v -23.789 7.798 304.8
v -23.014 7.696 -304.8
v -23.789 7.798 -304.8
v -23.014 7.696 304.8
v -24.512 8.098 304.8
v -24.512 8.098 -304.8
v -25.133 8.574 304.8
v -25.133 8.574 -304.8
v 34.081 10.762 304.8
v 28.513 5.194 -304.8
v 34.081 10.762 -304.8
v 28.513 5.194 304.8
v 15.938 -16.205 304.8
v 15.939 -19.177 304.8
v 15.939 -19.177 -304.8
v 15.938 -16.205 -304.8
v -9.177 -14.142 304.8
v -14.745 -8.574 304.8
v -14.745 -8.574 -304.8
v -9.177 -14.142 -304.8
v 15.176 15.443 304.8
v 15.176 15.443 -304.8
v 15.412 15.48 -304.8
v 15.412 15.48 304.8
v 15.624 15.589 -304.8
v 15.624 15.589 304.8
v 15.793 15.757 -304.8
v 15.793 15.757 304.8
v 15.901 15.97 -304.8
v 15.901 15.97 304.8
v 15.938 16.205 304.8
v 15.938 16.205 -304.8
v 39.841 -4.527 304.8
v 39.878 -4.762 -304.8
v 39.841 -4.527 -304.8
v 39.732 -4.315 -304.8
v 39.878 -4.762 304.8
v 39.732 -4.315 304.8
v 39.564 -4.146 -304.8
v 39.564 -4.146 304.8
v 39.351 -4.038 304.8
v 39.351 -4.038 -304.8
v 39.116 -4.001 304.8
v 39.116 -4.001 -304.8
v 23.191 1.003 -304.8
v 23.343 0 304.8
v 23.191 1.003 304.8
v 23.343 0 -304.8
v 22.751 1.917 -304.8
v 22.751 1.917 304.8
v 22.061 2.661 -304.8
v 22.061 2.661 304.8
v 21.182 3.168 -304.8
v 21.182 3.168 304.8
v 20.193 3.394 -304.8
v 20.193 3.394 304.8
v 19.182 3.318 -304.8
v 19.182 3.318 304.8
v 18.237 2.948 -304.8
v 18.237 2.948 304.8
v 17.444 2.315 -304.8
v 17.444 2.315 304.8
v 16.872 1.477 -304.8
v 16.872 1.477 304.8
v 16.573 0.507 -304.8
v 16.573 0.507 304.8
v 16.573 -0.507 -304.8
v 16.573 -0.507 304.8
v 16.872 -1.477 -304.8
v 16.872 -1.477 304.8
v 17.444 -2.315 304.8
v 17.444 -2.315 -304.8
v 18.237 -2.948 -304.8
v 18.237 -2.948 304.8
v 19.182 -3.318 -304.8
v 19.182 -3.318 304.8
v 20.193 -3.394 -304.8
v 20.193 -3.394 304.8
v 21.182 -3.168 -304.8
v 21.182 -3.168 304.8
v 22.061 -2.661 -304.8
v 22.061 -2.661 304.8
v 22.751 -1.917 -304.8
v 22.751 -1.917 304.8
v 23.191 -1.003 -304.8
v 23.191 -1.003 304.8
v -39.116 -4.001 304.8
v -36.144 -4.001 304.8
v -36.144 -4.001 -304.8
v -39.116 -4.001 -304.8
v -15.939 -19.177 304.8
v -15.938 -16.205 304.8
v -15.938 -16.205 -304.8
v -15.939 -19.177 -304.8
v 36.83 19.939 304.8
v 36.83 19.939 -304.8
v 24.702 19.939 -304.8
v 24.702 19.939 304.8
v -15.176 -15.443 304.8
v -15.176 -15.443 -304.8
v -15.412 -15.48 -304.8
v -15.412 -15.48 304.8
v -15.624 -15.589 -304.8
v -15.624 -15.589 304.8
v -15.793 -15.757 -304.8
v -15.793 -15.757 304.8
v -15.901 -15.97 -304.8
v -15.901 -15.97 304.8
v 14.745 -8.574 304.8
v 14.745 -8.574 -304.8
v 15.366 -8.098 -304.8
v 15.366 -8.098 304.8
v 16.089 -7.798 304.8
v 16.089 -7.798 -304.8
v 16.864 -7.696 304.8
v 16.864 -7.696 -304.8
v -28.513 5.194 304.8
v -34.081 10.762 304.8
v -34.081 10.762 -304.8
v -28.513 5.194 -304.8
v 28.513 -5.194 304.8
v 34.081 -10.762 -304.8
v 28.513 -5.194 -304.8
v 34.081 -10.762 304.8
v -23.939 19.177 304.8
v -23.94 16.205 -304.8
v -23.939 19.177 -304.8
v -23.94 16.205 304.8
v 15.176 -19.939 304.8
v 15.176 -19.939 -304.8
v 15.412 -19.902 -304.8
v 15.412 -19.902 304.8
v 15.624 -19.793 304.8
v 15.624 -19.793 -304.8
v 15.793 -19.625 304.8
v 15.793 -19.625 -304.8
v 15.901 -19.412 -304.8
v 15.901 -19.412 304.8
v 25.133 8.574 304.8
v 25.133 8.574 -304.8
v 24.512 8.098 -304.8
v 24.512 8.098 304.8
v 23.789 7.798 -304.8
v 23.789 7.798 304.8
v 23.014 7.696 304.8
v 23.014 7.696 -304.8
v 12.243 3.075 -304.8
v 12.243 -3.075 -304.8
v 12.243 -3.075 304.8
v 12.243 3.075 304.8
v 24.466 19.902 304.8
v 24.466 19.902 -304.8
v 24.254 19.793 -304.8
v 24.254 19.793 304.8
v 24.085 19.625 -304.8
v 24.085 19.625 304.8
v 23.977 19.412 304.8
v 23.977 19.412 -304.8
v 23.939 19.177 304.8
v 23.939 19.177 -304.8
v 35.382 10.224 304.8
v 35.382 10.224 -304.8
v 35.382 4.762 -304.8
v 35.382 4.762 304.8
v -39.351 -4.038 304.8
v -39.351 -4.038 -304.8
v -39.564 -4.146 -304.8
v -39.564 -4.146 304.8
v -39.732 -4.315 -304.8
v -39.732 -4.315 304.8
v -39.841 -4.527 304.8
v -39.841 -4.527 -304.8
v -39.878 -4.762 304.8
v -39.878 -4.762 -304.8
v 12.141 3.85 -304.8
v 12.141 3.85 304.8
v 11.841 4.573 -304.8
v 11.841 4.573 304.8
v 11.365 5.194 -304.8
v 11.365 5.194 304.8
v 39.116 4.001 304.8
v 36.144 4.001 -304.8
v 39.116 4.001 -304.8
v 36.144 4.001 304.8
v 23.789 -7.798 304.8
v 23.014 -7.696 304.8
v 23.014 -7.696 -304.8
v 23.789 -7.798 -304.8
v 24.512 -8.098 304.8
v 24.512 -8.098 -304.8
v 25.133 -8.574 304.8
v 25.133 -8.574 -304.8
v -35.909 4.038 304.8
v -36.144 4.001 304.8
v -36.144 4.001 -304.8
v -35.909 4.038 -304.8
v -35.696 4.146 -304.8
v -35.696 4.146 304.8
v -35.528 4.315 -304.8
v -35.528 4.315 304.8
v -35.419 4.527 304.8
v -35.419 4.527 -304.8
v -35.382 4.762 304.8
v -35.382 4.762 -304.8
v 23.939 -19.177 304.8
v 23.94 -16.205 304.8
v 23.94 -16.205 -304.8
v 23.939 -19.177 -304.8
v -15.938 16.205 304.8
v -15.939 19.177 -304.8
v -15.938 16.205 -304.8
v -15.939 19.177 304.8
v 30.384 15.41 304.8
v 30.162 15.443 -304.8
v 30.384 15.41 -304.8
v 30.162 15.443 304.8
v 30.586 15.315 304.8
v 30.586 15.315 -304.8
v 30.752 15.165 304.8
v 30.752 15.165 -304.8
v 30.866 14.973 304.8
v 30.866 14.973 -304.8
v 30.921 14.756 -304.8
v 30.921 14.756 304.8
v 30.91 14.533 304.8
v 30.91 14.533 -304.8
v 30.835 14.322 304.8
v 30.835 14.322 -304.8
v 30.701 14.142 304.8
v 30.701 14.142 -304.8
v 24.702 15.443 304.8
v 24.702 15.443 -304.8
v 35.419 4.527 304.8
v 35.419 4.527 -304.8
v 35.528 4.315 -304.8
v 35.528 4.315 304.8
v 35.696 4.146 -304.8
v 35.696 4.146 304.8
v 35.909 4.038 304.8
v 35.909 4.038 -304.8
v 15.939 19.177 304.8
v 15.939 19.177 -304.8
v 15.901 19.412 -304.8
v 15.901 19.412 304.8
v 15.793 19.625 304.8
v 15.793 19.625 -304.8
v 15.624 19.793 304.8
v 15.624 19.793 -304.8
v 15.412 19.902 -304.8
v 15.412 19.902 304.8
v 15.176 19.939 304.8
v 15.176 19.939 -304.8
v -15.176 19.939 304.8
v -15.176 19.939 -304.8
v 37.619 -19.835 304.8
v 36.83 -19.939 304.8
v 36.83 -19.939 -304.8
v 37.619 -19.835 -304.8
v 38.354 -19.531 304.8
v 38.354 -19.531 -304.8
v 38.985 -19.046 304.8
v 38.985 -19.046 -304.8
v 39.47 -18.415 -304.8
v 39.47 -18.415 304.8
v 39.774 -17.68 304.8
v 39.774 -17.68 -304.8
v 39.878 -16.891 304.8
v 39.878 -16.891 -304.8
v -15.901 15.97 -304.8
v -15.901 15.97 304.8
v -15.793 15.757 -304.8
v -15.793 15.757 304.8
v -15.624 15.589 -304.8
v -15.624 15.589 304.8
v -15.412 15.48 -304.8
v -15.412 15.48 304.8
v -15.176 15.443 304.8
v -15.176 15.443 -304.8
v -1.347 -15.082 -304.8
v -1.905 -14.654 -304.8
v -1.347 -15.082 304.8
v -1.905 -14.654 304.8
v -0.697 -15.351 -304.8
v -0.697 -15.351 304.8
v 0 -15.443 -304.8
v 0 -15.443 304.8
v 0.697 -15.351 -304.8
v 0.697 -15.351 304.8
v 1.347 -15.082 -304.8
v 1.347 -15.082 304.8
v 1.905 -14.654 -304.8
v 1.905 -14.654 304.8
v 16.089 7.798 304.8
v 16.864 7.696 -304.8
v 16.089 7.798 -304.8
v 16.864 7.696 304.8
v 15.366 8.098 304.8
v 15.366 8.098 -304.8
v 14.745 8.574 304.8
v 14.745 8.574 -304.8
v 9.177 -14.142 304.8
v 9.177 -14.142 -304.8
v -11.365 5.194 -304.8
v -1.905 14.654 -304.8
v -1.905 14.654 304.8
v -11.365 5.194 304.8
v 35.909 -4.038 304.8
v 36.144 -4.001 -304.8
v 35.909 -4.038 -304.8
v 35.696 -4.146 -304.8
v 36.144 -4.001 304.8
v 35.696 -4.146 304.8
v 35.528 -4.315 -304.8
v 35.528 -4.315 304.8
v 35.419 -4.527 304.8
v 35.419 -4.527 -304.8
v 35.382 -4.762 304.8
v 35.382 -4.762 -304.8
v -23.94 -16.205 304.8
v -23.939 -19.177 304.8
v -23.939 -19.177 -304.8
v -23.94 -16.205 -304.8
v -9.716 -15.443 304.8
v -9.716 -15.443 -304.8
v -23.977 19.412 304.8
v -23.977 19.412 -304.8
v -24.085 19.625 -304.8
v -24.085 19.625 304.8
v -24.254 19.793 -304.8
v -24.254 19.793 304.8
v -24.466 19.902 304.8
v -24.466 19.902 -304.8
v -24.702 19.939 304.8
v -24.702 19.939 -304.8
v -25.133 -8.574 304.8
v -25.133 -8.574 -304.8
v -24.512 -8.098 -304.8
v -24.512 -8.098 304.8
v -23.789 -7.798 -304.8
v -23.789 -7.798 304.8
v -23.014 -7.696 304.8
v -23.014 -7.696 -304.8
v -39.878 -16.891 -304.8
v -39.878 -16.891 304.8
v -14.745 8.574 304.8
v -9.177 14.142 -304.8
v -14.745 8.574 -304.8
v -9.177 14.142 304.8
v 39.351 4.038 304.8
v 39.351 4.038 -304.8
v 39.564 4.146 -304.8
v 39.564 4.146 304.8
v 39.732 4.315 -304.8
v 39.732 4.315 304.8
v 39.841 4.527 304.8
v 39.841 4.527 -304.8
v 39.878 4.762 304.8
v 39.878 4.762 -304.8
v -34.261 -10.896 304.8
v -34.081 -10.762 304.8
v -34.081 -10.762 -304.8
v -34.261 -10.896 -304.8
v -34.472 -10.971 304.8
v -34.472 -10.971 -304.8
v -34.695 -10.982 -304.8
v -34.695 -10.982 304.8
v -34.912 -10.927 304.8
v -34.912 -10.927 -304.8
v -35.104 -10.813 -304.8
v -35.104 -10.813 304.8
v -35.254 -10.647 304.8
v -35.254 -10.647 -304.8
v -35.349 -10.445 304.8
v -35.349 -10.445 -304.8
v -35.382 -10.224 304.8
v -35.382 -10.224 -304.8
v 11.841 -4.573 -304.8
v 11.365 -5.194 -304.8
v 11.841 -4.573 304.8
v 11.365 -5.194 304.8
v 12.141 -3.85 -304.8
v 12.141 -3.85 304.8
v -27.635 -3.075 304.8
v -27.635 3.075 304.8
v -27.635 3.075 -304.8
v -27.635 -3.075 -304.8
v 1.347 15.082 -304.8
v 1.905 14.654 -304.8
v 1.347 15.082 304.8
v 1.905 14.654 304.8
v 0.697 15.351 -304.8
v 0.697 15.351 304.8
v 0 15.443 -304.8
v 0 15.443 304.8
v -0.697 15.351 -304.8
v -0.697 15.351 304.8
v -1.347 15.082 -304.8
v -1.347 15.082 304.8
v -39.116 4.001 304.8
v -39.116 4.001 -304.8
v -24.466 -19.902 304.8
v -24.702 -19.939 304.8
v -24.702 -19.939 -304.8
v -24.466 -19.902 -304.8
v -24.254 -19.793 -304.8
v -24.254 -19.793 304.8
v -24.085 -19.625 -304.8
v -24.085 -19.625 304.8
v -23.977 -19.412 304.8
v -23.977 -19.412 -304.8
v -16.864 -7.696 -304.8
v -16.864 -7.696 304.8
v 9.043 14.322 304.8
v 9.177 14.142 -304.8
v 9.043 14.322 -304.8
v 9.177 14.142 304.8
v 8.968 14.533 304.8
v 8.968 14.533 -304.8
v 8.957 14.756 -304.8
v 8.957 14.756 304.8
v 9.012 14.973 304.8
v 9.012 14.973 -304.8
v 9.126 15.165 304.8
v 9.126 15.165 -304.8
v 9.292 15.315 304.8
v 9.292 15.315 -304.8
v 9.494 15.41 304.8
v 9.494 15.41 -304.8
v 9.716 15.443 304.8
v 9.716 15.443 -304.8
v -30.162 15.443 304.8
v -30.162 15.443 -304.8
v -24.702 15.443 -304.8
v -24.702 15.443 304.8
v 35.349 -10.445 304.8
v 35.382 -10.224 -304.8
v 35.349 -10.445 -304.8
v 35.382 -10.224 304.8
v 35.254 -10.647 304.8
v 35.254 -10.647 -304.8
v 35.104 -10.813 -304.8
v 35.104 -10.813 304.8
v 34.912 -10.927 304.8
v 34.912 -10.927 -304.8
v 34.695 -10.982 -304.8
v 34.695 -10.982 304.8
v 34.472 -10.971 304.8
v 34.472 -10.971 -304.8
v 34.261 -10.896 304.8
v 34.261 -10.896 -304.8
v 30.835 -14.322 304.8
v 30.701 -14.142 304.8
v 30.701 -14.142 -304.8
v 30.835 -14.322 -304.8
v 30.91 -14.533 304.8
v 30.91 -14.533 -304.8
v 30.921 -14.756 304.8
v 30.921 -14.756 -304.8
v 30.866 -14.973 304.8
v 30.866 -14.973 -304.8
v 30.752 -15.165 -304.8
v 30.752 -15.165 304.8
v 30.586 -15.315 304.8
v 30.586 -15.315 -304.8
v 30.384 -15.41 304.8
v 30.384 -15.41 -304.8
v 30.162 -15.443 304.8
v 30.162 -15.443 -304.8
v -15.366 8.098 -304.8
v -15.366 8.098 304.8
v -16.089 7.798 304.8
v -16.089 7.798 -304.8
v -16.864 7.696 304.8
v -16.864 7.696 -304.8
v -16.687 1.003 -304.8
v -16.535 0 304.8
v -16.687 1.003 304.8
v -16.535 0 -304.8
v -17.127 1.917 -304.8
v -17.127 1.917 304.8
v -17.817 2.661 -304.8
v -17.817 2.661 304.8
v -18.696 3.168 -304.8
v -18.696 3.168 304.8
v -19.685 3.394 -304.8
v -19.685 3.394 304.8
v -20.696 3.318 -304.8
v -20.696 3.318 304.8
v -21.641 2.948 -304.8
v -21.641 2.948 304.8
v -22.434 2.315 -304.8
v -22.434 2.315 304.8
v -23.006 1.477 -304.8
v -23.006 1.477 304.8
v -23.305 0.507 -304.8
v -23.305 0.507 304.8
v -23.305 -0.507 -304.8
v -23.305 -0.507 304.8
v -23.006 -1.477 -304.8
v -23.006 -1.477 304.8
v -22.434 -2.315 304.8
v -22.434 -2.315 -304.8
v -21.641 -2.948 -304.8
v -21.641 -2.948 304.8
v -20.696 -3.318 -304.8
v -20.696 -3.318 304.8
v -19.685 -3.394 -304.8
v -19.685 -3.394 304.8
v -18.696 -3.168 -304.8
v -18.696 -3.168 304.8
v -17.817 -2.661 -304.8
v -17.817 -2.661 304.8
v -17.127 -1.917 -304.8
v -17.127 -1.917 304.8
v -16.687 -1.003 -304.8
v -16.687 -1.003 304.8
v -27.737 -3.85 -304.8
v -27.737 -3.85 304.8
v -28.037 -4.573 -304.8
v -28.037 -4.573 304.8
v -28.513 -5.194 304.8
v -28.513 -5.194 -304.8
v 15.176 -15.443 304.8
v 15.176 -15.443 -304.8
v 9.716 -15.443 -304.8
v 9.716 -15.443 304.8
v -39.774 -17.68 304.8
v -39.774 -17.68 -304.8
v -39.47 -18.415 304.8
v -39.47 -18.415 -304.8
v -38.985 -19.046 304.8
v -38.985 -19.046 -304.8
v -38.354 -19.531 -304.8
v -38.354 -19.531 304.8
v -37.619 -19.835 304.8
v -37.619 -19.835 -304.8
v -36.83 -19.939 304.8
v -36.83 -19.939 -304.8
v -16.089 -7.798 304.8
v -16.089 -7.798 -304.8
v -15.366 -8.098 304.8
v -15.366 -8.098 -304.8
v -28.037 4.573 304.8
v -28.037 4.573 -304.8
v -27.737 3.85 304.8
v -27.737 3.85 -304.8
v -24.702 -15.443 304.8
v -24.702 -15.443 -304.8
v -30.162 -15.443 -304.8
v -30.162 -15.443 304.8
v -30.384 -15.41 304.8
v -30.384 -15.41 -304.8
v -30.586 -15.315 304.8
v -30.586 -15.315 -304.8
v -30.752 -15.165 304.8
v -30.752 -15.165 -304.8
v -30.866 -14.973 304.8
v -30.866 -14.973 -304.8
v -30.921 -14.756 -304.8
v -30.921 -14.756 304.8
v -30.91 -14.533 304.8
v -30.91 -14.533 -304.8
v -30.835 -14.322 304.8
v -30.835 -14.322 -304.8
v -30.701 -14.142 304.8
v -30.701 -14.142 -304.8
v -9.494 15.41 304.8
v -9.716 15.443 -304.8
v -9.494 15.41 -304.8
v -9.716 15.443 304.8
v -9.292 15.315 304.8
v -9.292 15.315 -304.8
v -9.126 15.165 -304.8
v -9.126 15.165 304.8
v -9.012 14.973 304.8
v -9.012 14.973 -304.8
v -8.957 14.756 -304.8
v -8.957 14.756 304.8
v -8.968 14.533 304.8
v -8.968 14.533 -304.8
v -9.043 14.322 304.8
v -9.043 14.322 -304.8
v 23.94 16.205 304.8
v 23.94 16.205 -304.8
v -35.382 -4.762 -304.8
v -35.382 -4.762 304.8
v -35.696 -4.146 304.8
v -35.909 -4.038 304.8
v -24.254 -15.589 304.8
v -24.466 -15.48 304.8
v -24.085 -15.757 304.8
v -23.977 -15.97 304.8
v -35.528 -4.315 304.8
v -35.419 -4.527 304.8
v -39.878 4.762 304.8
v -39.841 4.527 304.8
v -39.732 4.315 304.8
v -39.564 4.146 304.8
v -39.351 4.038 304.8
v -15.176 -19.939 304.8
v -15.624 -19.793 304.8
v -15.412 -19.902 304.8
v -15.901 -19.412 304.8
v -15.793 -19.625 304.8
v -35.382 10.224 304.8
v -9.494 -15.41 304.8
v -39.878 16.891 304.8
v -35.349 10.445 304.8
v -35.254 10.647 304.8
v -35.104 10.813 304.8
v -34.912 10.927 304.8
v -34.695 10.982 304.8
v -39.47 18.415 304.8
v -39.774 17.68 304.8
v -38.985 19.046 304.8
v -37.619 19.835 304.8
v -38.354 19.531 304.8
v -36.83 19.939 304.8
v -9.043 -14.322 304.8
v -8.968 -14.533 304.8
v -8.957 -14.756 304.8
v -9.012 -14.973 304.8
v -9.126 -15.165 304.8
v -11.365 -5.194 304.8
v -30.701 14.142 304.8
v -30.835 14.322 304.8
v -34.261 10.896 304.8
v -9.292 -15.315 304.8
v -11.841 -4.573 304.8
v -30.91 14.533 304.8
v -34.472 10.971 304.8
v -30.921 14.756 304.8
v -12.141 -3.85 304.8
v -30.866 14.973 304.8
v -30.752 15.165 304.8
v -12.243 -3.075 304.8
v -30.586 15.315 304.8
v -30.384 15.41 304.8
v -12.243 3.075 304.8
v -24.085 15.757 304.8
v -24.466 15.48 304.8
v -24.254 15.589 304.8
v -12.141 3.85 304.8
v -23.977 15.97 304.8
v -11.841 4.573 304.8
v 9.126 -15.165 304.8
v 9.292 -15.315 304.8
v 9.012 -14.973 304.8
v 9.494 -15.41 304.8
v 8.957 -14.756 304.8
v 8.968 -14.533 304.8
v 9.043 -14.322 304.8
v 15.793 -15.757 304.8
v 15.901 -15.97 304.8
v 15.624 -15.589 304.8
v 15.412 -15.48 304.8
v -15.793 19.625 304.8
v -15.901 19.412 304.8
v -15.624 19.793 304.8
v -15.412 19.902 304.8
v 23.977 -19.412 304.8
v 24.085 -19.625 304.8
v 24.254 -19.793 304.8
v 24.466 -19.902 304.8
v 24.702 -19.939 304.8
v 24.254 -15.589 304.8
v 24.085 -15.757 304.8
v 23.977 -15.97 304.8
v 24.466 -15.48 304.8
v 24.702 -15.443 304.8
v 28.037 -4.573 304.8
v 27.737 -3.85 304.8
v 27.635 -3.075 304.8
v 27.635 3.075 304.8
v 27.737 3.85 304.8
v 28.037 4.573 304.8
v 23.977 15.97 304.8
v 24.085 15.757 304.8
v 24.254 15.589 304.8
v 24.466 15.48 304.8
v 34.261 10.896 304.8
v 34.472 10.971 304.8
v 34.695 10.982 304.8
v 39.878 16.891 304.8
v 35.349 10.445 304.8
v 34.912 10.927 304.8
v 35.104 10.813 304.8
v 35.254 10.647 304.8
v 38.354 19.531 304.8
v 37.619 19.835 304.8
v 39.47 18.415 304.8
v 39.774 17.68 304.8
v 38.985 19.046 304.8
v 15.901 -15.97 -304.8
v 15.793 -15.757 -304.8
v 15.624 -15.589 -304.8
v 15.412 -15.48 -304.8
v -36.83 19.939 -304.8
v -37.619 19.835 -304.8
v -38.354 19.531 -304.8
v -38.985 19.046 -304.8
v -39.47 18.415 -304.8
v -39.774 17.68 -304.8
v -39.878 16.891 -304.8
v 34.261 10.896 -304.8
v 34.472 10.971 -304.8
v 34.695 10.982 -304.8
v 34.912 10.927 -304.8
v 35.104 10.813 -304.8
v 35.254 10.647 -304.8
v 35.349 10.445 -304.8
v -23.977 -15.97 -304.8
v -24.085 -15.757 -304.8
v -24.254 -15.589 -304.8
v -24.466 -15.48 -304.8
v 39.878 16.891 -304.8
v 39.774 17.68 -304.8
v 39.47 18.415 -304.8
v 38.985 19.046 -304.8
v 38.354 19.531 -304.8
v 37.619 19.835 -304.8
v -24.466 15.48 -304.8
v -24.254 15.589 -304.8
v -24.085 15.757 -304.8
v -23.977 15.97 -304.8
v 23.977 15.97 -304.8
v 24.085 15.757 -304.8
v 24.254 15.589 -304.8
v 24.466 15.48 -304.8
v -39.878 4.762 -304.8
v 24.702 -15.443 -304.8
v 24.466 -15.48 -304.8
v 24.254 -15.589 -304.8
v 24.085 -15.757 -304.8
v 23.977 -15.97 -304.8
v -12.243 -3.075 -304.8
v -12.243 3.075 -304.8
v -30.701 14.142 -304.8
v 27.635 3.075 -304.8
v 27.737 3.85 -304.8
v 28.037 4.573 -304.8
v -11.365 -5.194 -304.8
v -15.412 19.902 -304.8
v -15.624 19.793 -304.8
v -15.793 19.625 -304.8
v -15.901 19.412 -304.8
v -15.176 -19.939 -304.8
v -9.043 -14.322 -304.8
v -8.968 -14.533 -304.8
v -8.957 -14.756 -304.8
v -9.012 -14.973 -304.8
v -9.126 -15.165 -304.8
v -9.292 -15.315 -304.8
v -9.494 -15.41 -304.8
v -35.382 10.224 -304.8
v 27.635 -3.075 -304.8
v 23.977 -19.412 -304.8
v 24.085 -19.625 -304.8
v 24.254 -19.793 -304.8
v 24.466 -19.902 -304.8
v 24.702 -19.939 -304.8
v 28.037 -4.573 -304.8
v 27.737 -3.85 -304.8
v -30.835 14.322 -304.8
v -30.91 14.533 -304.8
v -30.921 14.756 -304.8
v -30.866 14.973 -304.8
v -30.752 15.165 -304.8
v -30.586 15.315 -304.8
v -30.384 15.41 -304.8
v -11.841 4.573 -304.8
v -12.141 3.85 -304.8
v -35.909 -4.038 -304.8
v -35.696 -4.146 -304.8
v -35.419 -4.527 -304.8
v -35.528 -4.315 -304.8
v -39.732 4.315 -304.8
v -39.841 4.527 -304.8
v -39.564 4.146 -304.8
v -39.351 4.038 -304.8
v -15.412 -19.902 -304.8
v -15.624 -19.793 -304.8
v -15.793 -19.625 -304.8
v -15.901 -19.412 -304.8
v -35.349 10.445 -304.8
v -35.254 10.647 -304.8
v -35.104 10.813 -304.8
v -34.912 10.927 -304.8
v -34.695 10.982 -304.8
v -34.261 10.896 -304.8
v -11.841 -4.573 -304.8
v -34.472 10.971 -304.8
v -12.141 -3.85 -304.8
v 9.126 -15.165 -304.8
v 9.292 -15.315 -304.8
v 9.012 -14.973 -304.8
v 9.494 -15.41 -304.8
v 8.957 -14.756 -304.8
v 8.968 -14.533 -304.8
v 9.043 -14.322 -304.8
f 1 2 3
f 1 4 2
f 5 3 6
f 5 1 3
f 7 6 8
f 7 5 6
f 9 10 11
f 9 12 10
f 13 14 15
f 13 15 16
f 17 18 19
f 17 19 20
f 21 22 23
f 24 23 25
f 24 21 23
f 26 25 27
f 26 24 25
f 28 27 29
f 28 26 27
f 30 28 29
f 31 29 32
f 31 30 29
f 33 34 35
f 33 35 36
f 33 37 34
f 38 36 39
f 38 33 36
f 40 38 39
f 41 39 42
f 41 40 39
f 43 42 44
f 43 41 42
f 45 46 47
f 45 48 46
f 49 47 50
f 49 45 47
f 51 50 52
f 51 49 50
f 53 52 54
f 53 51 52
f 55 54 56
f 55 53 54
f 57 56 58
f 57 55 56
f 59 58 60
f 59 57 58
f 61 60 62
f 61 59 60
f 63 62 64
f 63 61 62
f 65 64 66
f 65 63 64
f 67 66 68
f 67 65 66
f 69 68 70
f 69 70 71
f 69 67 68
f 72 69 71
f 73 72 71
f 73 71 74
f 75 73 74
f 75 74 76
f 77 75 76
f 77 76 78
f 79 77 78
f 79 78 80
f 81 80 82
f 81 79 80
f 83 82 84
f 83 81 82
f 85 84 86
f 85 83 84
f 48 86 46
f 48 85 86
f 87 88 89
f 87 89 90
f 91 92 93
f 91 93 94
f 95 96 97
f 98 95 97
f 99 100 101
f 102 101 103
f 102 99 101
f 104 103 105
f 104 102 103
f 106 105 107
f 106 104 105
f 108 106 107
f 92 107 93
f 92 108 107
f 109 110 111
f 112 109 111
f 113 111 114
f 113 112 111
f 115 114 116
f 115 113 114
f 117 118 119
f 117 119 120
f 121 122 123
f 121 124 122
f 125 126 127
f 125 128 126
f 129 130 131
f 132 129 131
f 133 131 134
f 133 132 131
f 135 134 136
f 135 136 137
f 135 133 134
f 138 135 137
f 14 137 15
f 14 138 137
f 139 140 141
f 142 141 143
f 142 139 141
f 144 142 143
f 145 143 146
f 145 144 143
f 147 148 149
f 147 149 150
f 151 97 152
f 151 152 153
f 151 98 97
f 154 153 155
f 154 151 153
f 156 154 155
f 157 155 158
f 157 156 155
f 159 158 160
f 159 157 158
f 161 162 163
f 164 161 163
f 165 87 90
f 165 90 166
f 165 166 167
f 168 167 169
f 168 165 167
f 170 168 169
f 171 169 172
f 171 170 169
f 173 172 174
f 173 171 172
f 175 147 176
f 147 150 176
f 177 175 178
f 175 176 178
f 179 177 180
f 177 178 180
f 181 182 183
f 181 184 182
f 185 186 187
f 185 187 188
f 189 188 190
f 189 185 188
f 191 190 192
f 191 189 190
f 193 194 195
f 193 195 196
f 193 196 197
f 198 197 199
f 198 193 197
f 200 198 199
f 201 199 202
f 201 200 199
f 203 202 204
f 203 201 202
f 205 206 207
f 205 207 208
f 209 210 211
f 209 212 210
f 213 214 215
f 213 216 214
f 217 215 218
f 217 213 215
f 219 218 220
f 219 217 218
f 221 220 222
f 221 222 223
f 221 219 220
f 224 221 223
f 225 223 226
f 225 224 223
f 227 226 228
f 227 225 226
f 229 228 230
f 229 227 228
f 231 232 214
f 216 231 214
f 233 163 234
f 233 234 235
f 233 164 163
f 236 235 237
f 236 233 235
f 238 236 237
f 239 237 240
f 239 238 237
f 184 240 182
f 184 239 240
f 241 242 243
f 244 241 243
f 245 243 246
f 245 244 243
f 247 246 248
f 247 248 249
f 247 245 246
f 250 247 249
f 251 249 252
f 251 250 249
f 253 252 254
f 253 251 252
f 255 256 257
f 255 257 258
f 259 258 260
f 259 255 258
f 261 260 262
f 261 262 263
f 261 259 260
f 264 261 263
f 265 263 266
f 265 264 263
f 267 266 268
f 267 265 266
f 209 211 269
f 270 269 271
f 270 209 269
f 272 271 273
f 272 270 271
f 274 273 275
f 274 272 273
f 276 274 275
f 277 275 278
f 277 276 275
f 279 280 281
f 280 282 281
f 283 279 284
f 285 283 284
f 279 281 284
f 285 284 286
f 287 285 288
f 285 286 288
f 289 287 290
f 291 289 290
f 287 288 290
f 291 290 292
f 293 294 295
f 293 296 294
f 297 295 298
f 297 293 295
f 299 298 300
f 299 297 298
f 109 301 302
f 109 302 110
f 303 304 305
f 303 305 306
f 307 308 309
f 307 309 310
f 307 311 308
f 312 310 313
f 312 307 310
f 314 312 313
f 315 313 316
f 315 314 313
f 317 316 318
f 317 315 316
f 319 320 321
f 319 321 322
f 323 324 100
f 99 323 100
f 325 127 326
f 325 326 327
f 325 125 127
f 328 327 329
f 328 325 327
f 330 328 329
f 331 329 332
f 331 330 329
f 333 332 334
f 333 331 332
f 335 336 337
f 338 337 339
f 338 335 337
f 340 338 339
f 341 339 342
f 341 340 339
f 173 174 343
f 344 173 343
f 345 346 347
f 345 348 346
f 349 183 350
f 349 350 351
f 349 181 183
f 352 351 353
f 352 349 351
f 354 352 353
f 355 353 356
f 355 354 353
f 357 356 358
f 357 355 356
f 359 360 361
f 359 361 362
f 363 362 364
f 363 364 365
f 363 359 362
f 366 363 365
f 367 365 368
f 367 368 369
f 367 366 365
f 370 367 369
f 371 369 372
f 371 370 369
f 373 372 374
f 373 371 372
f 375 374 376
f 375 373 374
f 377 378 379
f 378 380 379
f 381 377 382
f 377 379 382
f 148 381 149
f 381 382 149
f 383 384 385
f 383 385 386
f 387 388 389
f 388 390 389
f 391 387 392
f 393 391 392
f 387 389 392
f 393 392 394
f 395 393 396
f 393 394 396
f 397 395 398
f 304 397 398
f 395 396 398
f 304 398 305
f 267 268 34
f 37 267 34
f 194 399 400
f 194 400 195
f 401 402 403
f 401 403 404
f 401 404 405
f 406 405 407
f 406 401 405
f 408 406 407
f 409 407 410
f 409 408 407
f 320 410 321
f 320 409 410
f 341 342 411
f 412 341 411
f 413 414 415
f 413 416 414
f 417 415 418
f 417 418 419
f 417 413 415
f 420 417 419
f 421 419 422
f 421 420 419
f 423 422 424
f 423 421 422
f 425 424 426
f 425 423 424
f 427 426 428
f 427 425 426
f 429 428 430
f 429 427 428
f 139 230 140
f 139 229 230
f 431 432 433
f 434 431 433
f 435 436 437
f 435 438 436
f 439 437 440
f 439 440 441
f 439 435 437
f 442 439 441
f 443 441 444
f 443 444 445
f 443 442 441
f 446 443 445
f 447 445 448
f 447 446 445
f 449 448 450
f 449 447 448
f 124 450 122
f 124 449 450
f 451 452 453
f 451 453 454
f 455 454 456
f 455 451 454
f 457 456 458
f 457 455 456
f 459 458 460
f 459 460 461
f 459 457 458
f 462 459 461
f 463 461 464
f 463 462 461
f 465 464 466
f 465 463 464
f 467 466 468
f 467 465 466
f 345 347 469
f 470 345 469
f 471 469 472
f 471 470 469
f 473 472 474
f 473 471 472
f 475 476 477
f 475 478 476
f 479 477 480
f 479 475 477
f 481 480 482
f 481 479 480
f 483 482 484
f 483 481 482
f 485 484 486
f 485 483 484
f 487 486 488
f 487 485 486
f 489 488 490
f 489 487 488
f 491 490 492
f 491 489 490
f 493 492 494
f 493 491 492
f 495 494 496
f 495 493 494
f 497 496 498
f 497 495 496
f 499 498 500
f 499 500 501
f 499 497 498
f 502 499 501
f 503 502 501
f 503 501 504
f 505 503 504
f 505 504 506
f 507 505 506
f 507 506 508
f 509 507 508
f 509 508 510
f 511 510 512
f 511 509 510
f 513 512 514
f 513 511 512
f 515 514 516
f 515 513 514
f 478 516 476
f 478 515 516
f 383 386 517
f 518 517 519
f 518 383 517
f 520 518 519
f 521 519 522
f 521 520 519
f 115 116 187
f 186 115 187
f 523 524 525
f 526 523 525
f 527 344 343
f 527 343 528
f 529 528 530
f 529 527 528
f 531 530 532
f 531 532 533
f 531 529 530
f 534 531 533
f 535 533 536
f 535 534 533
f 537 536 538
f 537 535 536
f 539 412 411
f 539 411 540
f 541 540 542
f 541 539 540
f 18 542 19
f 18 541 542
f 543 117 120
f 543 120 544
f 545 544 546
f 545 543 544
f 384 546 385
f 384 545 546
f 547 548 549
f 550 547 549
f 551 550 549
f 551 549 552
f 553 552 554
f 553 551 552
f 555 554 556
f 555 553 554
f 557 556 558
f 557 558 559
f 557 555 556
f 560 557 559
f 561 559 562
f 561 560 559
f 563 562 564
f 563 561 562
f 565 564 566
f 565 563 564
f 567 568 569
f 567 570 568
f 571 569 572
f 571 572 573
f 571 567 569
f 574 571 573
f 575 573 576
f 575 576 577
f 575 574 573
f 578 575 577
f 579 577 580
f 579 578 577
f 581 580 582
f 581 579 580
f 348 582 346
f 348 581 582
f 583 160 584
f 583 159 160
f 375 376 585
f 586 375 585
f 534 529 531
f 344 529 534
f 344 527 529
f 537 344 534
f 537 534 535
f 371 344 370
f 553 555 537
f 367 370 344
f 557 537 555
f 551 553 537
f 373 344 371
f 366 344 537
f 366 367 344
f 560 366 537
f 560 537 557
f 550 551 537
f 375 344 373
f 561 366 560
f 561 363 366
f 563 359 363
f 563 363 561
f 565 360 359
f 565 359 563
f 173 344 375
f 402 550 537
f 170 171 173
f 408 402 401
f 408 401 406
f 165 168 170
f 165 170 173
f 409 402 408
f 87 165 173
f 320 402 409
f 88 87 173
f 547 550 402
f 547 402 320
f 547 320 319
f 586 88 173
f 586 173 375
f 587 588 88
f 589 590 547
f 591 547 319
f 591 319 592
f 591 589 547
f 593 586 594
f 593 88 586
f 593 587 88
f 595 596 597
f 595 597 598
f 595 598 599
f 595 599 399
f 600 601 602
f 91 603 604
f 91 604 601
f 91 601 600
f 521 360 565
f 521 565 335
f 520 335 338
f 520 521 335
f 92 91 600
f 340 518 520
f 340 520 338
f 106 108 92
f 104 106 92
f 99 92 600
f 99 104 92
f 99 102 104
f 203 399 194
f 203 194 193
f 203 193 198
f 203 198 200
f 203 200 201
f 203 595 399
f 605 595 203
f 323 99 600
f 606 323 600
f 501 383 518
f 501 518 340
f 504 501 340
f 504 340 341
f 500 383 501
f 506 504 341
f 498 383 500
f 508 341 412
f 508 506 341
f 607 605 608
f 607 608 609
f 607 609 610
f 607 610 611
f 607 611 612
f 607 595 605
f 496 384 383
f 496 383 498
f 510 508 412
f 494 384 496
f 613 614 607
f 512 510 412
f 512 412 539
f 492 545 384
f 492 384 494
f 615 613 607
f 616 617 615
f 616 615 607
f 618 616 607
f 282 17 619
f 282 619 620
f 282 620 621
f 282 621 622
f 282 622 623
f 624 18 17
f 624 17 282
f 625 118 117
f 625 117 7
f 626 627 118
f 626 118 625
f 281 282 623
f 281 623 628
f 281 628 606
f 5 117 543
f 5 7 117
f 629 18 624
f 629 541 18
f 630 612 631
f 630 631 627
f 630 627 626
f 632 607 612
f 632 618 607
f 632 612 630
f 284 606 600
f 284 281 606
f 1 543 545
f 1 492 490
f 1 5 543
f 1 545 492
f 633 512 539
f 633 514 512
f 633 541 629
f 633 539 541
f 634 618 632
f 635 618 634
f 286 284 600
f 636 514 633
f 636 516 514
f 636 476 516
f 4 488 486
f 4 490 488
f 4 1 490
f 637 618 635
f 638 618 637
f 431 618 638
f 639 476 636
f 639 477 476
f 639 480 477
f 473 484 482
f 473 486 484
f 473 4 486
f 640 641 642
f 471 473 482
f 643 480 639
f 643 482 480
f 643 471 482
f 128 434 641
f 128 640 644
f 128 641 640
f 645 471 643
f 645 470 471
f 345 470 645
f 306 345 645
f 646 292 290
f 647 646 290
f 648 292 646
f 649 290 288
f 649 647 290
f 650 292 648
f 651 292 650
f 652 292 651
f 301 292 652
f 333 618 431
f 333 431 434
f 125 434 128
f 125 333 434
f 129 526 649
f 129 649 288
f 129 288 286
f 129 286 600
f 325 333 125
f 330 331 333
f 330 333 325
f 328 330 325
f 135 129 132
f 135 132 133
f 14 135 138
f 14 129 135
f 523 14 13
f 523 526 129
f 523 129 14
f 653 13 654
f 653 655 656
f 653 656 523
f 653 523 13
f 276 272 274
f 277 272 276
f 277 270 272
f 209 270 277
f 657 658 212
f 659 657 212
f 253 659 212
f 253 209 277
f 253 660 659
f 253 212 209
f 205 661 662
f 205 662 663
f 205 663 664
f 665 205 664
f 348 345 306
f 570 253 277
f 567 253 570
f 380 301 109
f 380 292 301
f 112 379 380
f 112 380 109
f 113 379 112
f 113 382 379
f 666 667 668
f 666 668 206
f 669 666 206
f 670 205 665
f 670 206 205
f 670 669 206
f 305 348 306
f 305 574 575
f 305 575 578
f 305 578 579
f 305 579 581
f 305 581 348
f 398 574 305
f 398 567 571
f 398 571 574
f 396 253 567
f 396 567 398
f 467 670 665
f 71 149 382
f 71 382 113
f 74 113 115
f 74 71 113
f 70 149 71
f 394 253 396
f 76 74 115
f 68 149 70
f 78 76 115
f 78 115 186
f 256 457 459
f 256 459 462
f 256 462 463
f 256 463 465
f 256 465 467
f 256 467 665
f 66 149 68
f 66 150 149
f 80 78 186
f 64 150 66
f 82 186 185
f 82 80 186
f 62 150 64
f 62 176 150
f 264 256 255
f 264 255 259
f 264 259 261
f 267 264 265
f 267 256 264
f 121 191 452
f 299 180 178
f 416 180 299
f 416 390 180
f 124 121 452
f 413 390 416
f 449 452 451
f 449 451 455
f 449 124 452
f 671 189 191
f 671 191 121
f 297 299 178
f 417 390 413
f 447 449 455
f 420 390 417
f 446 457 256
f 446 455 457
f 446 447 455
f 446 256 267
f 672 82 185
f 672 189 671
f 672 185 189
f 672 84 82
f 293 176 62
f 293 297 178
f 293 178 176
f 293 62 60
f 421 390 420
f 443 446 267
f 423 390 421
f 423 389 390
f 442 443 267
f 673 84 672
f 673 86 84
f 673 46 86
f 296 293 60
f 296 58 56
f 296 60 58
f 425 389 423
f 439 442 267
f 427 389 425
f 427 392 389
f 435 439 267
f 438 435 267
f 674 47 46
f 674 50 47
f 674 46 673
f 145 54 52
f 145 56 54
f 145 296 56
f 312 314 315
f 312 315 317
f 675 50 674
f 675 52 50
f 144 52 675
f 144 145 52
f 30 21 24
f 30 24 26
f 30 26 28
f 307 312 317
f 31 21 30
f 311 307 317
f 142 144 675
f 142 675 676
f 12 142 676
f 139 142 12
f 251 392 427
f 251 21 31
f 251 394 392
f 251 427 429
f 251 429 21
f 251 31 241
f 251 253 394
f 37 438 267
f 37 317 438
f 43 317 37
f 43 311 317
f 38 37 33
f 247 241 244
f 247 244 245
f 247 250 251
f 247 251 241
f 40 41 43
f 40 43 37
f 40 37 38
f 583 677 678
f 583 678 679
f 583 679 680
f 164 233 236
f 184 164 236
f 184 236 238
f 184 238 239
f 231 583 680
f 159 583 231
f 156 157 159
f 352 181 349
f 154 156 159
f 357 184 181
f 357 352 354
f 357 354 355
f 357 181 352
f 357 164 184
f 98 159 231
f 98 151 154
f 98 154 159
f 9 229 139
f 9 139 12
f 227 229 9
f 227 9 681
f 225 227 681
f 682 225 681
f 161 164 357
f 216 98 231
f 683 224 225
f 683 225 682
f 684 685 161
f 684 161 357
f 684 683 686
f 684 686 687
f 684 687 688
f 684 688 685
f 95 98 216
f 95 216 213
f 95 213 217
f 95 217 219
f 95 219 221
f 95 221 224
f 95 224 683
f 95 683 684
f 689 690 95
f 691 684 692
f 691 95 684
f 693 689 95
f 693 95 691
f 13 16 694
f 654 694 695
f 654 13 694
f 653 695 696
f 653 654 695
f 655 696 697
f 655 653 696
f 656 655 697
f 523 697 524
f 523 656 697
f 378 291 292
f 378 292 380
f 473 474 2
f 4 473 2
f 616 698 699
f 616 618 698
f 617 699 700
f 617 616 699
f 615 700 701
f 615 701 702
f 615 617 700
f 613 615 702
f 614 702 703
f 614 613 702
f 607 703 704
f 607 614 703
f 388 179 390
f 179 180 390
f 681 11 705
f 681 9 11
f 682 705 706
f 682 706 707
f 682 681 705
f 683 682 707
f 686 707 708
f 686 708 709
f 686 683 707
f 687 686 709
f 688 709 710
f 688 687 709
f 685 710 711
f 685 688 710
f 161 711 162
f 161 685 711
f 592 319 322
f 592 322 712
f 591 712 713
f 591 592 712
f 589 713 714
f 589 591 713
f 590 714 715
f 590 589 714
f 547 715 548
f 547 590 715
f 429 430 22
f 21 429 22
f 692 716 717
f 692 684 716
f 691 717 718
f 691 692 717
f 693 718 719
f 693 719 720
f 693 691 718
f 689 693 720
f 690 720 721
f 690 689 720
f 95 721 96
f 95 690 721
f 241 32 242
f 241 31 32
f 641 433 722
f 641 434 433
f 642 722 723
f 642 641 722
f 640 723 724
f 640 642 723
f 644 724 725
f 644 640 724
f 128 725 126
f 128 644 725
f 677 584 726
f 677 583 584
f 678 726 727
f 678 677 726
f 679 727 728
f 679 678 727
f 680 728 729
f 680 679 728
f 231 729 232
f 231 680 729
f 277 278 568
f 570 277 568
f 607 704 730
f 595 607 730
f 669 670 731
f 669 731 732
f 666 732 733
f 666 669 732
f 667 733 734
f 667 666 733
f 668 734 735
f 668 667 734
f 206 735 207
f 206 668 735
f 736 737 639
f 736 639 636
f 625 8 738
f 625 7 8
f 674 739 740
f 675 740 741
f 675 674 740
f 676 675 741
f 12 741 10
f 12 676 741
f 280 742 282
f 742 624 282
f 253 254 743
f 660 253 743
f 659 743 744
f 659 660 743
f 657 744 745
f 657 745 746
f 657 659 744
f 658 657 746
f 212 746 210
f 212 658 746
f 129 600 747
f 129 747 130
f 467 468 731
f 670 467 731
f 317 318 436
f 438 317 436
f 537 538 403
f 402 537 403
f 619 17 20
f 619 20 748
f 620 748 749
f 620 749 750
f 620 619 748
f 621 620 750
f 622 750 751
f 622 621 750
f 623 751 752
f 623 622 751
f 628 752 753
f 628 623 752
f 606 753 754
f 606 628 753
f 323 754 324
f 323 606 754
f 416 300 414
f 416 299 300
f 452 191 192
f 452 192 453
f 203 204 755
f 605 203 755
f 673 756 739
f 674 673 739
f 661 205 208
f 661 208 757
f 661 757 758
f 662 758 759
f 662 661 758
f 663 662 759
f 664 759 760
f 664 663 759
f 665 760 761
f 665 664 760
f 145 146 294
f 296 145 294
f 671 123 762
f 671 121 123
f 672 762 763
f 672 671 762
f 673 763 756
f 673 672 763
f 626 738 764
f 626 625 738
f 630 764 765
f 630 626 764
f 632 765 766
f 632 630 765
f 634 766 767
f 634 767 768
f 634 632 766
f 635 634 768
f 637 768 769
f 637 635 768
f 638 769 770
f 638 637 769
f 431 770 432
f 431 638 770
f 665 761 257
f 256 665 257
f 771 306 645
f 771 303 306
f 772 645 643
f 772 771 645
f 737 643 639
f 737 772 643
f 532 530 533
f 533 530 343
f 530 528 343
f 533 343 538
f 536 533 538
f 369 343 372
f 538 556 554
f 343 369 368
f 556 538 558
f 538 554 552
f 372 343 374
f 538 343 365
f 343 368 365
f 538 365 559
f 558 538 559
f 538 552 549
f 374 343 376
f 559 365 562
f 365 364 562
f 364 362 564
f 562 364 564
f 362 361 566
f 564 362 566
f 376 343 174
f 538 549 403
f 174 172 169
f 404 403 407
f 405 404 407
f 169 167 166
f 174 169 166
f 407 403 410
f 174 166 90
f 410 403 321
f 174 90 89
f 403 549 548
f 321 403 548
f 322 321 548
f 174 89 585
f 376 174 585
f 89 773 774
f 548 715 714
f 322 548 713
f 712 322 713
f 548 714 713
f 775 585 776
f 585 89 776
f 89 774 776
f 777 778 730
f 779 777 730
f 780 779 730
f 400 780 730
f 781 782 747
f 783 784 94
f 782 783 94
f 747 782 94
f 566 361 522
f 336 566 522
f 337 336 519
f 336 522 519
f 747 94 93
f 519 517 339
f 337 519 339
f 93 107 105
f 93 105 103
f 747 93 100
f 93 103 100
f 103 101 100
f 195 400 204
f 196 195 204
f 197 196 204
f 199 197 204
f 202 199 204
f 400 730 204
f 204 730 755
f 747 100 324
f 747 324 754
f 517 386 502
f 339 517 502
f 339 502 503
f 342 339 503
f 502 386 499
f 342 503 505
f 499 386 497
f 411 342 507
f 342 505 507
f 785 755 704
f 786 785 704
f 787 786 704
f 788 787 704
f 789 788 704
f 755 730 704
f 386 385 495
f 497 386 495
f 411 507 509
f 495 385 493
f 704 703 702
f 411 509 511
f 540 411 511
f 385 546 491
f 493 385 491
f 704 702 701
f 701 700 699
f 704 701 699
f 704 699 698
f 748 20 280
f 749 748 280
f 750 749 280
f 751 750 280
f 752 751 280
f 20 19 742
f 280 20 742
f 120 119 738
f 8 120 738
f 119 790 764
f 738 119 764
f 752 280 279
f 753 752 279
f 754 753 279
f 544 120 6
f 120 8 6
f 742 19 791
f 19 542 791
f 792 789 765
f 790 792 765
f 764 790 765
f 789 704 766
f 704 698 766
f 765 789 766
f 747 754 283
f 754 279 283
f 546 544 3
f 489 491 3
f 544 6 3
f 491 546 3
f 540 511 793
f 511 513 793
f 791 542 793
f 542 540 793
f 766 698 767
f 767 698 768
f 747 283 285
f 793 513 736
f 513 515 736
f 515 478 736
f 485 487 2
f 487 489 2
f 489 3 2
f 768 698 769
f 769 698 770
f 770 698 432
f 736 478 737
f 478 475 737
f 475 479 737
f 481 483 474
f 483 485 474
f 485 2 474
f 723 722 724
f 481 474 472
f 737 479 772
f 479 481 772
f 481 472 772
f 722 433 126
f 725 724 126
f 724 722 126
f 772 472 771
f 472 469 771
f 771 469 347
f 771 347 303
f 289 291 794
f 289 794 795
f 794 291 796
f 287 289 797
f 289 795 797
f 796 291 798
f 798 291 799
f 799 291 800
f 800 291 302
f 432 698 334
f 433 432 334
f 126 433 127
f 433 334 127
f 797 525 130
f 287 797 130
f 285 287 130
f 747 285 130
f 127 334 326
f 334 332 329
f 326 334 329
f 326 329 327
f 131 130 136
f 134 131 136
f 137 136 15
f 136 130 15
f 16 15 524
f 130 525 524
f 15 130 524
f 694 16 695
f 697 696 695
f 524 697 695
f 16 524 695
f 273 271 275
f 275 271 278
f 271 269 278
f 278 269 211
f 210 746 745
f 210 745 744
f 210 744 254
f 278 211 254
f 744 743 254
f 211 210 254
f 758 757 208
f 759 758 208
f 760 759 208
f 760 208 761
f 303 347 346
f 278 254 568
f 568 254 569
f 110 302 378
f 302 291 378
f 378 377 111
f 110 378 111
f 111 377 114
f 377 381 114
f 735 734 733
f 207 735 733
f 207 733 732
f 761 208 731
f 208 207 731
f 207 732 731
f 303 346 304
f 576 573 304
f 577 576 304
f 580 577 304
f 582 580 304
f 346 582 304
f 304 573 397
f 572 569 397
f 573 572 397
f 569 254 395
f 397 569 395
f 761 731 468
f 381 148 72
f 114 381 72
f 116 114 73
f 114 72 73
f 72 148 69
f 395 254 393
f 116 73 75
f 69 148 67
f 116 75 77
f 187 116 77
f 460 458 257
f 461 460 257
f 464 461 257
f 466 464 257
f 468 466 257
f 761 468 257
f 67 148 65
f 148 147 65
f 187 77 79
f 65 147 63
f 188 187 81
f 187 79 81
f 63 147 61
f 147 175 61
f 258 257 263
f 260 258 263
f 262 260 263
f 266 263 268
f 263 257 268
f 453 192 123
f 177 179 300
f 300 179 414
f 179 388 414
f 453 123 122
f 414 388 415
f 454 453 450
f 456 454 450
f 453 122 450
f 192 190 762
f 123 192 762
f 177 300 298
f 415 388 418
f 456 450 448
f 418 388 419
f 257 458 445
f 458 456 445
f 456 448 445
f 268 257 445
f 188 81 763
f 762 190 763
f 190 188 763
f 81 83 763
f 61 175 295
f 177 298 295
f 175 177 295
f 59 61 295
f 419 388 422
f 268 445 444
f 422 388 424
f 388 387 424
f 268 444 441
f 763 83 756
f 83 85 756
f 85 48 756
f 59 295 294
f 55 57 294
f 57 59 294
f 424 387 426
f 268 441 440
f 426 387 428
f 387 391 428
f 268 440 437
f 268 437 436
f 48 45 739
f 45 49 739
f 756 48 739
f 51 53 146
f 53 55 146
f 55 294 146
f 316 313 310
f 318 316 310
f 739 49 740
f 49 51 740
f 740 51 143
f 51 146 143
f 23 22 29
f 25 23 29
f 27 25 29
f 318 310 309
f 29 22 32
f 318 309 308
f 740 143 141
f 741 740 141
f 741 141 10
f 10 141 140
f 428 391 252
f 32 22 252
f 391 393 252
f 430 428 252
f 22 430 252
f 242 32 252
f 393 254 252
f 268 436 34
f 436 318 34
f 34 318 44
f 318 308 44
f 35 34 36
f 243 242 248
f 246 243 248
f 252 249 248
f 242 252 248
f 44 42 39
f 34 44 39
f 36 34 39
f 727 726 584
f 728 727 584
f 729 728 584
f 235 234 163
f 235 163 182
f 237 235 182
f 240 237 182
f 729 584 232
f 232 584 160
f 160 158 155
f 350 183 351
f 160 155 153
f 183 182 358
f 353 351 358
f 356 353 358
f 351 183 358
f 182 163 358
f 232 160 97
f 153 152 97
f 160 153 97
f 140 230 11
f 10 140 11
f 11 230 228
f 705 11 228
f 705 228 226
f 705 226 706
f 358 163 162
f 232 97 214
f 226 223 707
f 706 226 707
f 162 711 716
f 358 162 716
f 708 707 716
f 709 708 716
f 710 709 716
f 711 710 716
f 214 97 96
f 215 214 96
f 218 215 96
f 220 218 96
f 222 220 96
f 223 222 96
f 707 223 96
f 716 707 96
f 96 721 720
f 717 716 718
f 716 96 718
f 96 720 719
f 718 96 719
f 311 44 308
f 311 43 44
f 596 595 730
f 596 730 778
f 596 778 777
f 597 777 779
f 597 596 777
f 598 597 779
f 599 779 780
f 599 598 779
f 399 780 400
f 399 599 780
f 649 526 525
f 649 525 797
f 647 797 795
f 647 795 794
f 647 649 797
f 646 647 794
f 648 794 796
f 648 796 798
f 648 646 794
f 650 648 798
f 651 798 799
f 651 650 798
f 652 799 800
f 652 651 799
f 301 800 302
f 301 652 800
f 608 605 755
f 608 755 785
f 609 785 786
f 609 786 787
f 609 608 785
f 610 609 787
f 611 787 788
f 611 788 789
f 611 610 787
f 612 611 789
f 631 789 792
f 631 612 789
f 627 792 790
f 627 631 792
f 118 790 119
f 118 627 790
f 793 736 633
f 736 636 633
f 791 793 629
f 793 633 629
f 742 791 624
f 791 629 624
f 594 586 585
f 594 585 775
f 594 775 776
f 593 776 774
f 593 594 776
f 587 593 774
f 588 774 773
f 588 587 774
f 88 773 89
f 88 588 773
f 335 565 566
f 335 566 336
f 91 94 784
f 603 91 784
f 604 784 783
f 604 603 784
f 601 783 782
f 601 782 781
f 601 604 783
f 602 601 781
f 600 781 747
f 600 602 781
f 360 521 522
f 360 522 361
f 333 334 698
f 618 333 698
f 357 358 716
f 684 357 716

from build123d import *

# Parameters (mm, degrees)
SKETCH1_R           = 3.4036
BOSS_EXTRUDE1_DEPTH = 304.8


with BuildPart() as part:
    # Sketch1 → Boss-Extrude1 (new body, symmetric)
    with BuildSketch(Plane.XY):
        with BuildLine():
            Line((-39.878, 16.891), (-39.878, 4.7625))
            ThreePointArc((-39.878, 4.7625), (-39.654815367, 4.223684633), (-39.116, 4.0005))
            Line((-39.116, 4.0005), (-36.1442, 4.0005))
            ThreePointArc((-36.1442, 4.0005), (-35.605384633, 4.223684633), (-35.3822, 4.7625))
            Line((-35.3822, 4.7625), (-35.3822, 10.2235))
            ThreePointArc((-35.3822, 10.2235), (-34.911804775, 10.927496204), (-34.081384633, 10.762315367))
            Line((-34.081384633, 10.762315367), (-28.513059555, 5.19399029))
            ThreePointArc((-28.513059555, 5.19399029), (-27.863348265, 4.221628629), (-27.6352, 3.074649845))
            Line((-27.6352, 3.074649845), (-27.6352, -3.074649845))
            ThreePointArc((-27.6352, -3.074649845), (-27.863348265, -4.221628629), (-28.513059555, -5.19399029))
            Line((-28.513059555, -5.19399029), (-34.081384633, -10.762315367))
            ThreePointArc((-34.081384633, -10.762315367), (-34.911804775, -10.927496204), (-35.3822, -10.2235))
            Line((-35.3822, -10.2235), (-35.3822, -4.7625))
            ThreePointArc((-35.3822, -4.7625), (-35.605384633, -4.223684633), (-36.1442, -4.0005))
            Line((-36.1442, -4.0005), (-39.116, -4.0005))
            ThreePointArc((-39.116, -4.0005), (-39.654815367, -4.223684633), (-39.878, -4.7625))
            Line((-39.878, -4.7625), (-39.878, -16.891))
            ThreePointArc((-39.878, -16.891), (-38.985261469, -19.046261469), (-36.83, -19.939))
            Line((-36.83, -19.939), (-24.7015, -19.939))
            ThreePointArc((-24.7015, -19.939), (-24.162684633, -19.715815367), (-23.9395, -19.177))
            Line((-23.9395, -19.177), (-23.9395, -16.2052))
            ThreePointArc((-23.9395, -16.2052), (-24.162684633, -15.666384633), (-24.7015, -15.4432))
            Line((-24.7015, -15.4432), (-30.1625, -15.4432))
            ThreePointArc((-30.1625, -15.4432), (-30.866496204, -14.972804775), (-30.701315367, -14.142384633))
            Line((-30.701315367, -14.142384633), (-25.13299029, -8.574059555))
            ThreePointArc((-25.13299029, -8.574059555), (-24.160628629, -7.924348265), (-23.013649845, -7.6962))
            Line((-23.013649845, -7.6962), (-16.864350155, -7.6962))
            ThreePointArc((-16.864350155, -7.6962), (-15.717371371, -7.924348265), (-14.74500971, -8.574059555))
            Line((-14.74500971, -8.574059555), (-9.176684633, -14.142384633))
            ThreePointArc((-9.176684633, -14.142384633), (-9.011503796, -14.972804775), (-9.7155, -15.4432))
            Line((-9.7155, -15.4432), (-15.1765, -15.4432))
            ThreePointArc((-15.1765, -15.4432), (-15.715315367, -15.666384633), (-15.9385, -16.2052))
            Line((-15.9385, -16.2052), (-15.9385, -19.177))
            ThreePointArc((-15.9385, -19.177), (-15.715315367, -19.715815367), (-15.1765, -19.939))
            Line((-15.1765, -19.939), (15.1765, -19.939))
            ThreePointArc((15.1765, -19.939), (15.715315367, -19.715815367), (15.9385, -19.177))
            Line((15.9385, -19.177), (15.9385, -16.2052))
            ThreePointArc((15.9385, -16.2052), (15.715315367, -15.666384633), (15.1765, -15.4432))
            Line((15.1765, -15.4432), (9.7155, -15.4432))
            ThreePointArc((9.7155, -15.4432), (9.011503796, -14.972804775), (9.176684633, -14.142384633))
            Line((9.176684633, -14.142384633), (14.74500971, -8.574059555))
            ThreePointArc((14.74500971, -8.574059555), (15.717371371, -7.924348265), (16.864350155, -7.6962))
            Line((16.864350155, -7.6962), (23.013649845, -7.6962))
            ThreePointArc((23.013649845, -7.6962), (24.160628629, -7.924348265), (25.13299029, -8.574059555))
            Line((25.13299029, -8.574059555), (30.701315367, -14.142384633))
            ThreePointArc((30.701315367, -14.142384633), (30.866496204, -14.972804775), (30.1625, -15.4432))
            Line((30.1625, -15.4432), (24.7015, -15.4432))
            ThreePointArc((24.7015, -15.4432), (24.162684633, -15.666384633), (23.9395, -16.2052))
            Line((23.9395, -16.2052), (23.9395, -19.177))
            ThreePointArc((23.9395, -19.177), (24.162684633, -19.715815367), (24.7015, -19.939))
            Line((24.7015, -19.939), (36.83, -19.939))
            ThreePointArc((36.83, -19.939), (38.985261469, -19.046261469), (39.878, -16.891))
            Line((39.878, -16.891), (39.878, -4.7625))
            ThreePointArc((39.878, -4.7625), (39.654815367, -4.223684633), (39.116, -4.0005))
            Line((39.116, -4.0005), (36.1442, -4.0005))
            ThreePointArc((36.1442, -4.0005), (35.605384633, -4.223684633), (35.3822, -4.7625))
            Line((35.3822, -4.7625), (35.3822, -10.2235))
            ThreePointArc((35.3822, -10.2235), (34.911804775, -10.927496204), (34.081384633, -10.762315367))
            Line((34.081384633, -10.762315367), (28.513059555, -5.19399029))
            ThreePointArc((28.513059555, -5.19399029), (27.863348265, -4.221628629), (27.6352, -3.074649845))
            Line((27.6352, -3.074649845), (27.6352, 3.074649845))
            ThreePointArc((27.6352, 3.074649845), (27.863348265, 4.221628629), (28.513059555, 5.19399029))
            Line((28.513059555, 5.19399029), (34.081384633, 10.762315367))
            ThreePointArc((34.081384633, 10.762315367), (34.911804775, 10.927496204), (35.3822, 10.2235))
            Line((35.3822, 10.2235), (35.3822, 4.7625))
            ThreePointArc((35.3822, 4.7625), (35.605384633, 4.223684633), (36.1442, 4.0005))
            Line((36.1442, 4.0005), (39.116, 4.0005))
            ThreePointArc((39.116, 4.0005), (39.654815367, 4.223684633), (39.878, 4.7625))
            Line((39.878, 4.7625), (39.878, 16.891))
            ThreePointArc((39.878, 16.891), (38.985261469, 19.046261469), (36.83, 19.939))
            Line((36.83, 19.939), (24.7015, 19.939))
            ThreePointArc((24.7015, 19.939), (24.162684633, 19.715815367), (23.9395, 19.177))
            Line((23.9395, 19.177), (23.9395, 16.2052))
            ThreePointArc((23.9395, 16.2052), (24.162684633, 15.666384633), (24.7015, 15.4432))
            Line((24.7015, 15.4432), (30.1625, 15.4432))
            ThreePointArc((30.1625, 15.4432), (30.866496204, 14.972804775), (30.701315367, 14.142384633))
            Line((30.701315367, 14.142384633), (25.13299029, 8.574059555))
            ThreePointArc((25.13299029, 8.574059555), (24.160628629, 7.924348265), (23.013649845, 7.6962))
            Line((23.013649845, 7.6962), (16.864350155, 7.6962))
            ThreePointArc((16.864350155, 7.6962), (15.717371371, 7.924348265), (14.74500971, 8.574059555))
            Line((14.74500971, 8.574059555), (9.176684633, 14.142384633))
            ThreePointArc((9.176684633, 14.142384633), (9.011503796, 14.972804775), (9.7155, 15.4432))
            Line((9.7155, 15.4432), (15.1765, 15.4432))
            ThreePointArc((15.1765, 15.4432), (15.715315367, 15.666384633), (15.9385, 16.2052))
            Line((15.9385, 16.2052), (15.9385, 19.177))
            ThreePointArc((15.9385, 19.177), (15.715315367, 19.715815367), (15.1765, 19.939))
            Line((15.1765, 19.939), (-15.1765, 19.939))
            ThreePointArc((-15.1765, 19.939), (-15.715315367, 19.715815367), (-15.9385, 19.177))
            Line((-15.9385, 19.177), (-15.9385, 16.2052))
            ThreePointArc((-15.9385, 16.2052), (-15.715315367, 15.666384633), (-15.1765, 15.4432))
            Line((-15.1765, 15.4432), (-9.7155, 15.4432))
            ThreePointArc((-9.7155, 15.4432), (-9.011503796, 14.972804775), (-9.176684633, 14.142384633))
            Line((-9.176684633, 14.142384633), (-14.74500971, 8.574059555))
            ThreePointArc((-14.74500971, 8.574059555), (-15.717371371, 7.924348265), (-16.864350155, 7.6962))
            Line((-16.864350155, 7.6962), (-23.013649845, 7.6962))
            ThreePointArc((-23.013649845, 7.6962), (-24.160628629, 7.924348265), (-25.13299029, 8.574059555))
            Line((-25.13299029, 8.574059555), (-30.701315367, 14.142384633))
            ThreePointArc((-30.701315367, 14.142384633), (-30.866496204, 14.972804775), (-30.1625, 15.4432))
            Line((-30.1625, 15.4432), (-24.7015, 15.4432))
            ThreePointArc((-24.7015, 15.4432), (-24.162684633, 15.666384633), (-23.9395, 16.2052))
            Line((-23.9395, 16.2052), (-23.9395, 19.177))
            ThreePointArc((-23.9395, 19.177), (-24.162684633, 19.715815367), (-24.7015, 19.939))
            Line((-24.7015, 19.939), (-36.83, 19.939))
            ThreePointArc((-36.83, 19.939), (-38.985261469, 19.046261469), (-39.878, 16.891))
        make_face()
        with Locations((-19.939, 0)):
            Circle(SKETCH1_R, mode=Mode.SUBTRACT)
        with Locations((19.939, 0)):
            Circle(SKETCH1_R, mode=Mode.SUBTRACT)
        with BuildLine():
            Line((-12.2428, 3.074649845), (-12.2428, -3.074649845))
            ThreePointArc((-12.2428, -3.074649845), (-12.014651735, -4.221628629), (-11.364940445, -5.19399029))
            Line((-11.364940445, -5.19399029), (-1.904671503, -14.654259232))
            ThreePointArc((-1.904671503, -14.654259232), (0, -15.4432), (1.904671503, -14.654259232))
            Line((1.904671503, -14.654259232), (11.364940445, -5.19399029))
            ThreePointArc((11.364940445, -5.19399029), (12.014651735, -4.221628629), (12.2428, -3.074649845))
            Line((12.2428, -3.074649845), (12.2428, 3.074649845))
            ThreePointArc((12.2428, 3.074649845), (12.014651735, 4.221628629), (11.364940445, 5.19399029))
            Line((11.364940445, 5.19399029), (1.904671503, 14.654259232))
            ThreePointArc((1.904671503, 14.654259232), (0, 15.4432), (-1.904671503, 14.654259232))
            Line((-1.904671503, 14.654259232), (-11.364940445, 5.19399029))
            ThreePointArc((-11.364940445, 5.19399029), (-12.014651735, 4.221628629), (-12.2428, 3.074649845))
        make_face(mode=Mode.SUBTRACT)
    extrude(amount=BOSS_EXTRUDE1_DEPTH, both=True)


solid = part.part
